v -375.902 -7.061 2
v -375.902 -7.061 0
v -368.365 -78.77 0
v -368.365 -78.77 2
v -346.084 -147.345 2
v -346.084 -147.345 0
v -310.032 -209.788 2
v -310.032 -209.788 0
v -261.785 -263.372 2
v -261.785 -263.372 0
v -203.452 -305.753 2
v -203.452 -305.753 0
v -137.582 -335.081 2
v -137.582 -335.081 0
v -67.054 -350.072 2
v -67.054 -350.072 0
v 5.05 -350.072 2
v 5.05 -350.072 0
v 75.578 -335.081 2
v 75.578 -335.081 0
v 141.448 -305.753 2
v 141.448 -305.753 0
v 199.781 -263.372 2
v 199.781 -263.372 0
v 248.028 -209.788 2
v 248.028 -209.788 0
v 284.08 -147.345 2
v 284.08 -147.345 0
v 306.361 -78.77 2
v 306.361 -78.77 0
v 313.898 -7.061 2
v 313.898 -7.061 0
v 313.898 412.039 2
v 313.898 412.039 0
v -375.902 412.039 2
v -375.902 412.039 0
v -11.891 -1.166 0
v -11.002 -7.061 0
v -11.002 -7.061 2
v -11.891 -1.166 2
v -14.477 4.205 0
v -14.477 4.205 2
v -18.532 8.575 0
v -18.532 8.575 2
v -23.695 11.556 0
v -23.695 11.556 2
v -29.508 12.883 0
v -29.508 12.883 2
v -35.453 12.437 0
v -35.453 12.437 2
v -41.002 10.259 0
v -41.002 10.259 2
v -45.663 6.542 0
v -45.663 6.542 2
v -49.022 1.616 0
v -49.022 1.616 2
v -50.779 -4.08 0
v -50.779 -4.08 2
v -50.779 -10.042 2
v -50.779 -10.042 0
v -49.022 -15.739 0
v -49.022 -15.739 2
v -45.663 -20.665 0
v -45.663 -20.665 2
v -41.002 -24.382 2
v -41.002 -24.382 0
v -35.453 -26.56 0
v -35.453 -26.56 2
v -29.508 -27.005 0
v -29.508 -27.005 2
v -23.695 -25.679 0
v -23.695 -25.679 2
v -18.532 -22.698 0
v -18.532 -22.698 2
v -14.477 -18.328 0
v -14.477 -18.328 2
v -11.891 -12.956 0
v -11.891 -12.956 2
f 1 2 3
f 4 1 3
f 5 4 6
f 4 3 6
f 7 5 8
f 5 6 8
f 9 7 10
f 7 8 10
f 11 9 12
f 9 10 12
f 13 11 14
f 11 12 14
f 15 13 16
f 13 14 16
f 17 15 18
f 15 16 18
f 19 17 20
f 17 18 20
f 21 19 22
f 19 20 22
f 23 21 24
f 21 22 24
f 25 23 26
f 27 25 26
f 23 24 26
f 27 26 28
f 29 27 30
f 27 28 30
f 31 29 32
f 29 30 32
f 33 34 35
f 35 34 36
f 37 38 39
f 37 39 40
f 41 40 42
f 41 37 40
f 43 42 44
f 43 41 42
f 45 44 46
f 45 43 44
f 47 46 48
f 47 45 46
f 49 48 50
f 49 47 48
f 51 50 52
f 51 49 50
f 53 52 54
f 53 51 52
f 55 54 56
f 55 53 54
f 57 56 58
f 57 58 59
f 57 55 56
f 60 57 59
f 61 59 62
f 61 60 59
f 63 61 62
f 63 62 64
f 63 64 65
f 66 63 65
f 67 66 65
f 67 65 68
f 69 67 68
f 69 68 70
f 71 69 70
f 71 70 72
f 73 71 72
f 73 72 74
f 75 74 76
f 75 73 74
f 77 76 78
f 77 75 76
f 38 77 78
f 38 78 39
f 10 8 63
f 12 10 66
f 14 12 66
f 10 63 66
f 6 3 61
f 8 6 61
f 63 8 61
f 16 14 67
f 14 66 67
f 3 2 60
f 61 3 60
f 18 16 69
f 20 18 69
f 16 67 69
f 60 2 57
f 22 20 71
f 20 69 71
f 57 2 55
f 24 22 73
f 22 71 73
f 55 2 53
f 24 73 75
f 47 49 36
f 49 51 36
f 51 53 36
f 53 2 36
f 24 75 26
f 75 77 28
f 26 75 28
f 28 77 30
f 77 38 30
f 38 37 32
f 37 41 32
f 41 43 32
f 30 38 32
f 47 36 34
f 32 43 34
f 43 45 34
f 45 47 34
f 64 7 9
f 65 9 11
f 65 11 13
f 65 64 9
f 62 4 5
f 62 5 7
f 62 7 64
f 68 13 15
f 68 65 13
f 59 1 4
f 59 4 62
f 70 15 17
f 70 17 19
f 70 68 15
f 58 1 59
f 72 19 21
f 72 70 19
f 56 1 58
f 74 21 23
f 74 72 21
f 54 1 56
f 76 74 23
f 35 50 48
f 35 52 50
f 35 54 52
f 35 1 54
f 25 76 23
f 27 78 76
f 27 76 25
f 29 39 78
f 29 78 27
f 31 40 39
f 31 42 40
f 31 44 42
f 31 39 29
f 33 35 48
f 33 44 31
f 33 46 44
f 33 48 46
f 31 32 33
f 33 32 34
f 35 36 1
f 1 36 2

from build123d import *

# Parameters (mm, degrees)
SKETCH1_R           = 20
BOSS_EXTRUDE1_DEPTH = 2


with BuildPart() as part:
    # Sketch1 → Boss-Extrude1 (new body)
    # profile 1 of 2: a face of its own
    with BuildSketch(Plane.XY):
        with BuildLine():
            Line((-375.902130633, 412.038787591), (-375.902130633, -7.061212409))
            ThreePointArc((-375.902130633, -7.061212409), (-31.002130633, -351.961212409), (313.897869367, -7.061212409))
            Line((313.897869367, -7.061212409), (313.897869367, 412.038787591))
            Line((313.897869367, 412.038787591), (311.897869367, 412.038787591))
            Line((311.897869367, 412.038787591), (311.897869367, -7.061212409))
            ThreePointArc((311.897869367, -7.061212409), (-31.002130633, -349.961212409), (-373.902130633, -7.061212409))
            Line((-373.902130633, -7.061212409), (-373.902130633, 412.038787591))
            Line((-373.902130633, 412.038787591), (-375.902130633, 412.038787591))
        make_face()
    # profile 2 of 2: a face of its own
    with BuildSketch(Plane.XY):
        with BuildLine():
            Line((311.897869367, 412.038787591), (-373.902130633, 412.038787591))
            Line((-373.902130633, 412.038787591), (-373.902130633, -7.061212409))
            ThreePointArc((-373.902130633, -7.061212409), (-31.002130633, -349.961212409), (311.897869367, -7.061212409))
            Line((311.897869367, -7.061212409), (311.897869367, 412.038787591))
        make_face()
        with Locations((-31.002130633, -7.061212409)):
            Circle(SKETCH1_R, mode=Mode.SUBTRACT)
    extrude(amount=BOSS_EXTRUDE1_DEPTH)


solid = part.part
